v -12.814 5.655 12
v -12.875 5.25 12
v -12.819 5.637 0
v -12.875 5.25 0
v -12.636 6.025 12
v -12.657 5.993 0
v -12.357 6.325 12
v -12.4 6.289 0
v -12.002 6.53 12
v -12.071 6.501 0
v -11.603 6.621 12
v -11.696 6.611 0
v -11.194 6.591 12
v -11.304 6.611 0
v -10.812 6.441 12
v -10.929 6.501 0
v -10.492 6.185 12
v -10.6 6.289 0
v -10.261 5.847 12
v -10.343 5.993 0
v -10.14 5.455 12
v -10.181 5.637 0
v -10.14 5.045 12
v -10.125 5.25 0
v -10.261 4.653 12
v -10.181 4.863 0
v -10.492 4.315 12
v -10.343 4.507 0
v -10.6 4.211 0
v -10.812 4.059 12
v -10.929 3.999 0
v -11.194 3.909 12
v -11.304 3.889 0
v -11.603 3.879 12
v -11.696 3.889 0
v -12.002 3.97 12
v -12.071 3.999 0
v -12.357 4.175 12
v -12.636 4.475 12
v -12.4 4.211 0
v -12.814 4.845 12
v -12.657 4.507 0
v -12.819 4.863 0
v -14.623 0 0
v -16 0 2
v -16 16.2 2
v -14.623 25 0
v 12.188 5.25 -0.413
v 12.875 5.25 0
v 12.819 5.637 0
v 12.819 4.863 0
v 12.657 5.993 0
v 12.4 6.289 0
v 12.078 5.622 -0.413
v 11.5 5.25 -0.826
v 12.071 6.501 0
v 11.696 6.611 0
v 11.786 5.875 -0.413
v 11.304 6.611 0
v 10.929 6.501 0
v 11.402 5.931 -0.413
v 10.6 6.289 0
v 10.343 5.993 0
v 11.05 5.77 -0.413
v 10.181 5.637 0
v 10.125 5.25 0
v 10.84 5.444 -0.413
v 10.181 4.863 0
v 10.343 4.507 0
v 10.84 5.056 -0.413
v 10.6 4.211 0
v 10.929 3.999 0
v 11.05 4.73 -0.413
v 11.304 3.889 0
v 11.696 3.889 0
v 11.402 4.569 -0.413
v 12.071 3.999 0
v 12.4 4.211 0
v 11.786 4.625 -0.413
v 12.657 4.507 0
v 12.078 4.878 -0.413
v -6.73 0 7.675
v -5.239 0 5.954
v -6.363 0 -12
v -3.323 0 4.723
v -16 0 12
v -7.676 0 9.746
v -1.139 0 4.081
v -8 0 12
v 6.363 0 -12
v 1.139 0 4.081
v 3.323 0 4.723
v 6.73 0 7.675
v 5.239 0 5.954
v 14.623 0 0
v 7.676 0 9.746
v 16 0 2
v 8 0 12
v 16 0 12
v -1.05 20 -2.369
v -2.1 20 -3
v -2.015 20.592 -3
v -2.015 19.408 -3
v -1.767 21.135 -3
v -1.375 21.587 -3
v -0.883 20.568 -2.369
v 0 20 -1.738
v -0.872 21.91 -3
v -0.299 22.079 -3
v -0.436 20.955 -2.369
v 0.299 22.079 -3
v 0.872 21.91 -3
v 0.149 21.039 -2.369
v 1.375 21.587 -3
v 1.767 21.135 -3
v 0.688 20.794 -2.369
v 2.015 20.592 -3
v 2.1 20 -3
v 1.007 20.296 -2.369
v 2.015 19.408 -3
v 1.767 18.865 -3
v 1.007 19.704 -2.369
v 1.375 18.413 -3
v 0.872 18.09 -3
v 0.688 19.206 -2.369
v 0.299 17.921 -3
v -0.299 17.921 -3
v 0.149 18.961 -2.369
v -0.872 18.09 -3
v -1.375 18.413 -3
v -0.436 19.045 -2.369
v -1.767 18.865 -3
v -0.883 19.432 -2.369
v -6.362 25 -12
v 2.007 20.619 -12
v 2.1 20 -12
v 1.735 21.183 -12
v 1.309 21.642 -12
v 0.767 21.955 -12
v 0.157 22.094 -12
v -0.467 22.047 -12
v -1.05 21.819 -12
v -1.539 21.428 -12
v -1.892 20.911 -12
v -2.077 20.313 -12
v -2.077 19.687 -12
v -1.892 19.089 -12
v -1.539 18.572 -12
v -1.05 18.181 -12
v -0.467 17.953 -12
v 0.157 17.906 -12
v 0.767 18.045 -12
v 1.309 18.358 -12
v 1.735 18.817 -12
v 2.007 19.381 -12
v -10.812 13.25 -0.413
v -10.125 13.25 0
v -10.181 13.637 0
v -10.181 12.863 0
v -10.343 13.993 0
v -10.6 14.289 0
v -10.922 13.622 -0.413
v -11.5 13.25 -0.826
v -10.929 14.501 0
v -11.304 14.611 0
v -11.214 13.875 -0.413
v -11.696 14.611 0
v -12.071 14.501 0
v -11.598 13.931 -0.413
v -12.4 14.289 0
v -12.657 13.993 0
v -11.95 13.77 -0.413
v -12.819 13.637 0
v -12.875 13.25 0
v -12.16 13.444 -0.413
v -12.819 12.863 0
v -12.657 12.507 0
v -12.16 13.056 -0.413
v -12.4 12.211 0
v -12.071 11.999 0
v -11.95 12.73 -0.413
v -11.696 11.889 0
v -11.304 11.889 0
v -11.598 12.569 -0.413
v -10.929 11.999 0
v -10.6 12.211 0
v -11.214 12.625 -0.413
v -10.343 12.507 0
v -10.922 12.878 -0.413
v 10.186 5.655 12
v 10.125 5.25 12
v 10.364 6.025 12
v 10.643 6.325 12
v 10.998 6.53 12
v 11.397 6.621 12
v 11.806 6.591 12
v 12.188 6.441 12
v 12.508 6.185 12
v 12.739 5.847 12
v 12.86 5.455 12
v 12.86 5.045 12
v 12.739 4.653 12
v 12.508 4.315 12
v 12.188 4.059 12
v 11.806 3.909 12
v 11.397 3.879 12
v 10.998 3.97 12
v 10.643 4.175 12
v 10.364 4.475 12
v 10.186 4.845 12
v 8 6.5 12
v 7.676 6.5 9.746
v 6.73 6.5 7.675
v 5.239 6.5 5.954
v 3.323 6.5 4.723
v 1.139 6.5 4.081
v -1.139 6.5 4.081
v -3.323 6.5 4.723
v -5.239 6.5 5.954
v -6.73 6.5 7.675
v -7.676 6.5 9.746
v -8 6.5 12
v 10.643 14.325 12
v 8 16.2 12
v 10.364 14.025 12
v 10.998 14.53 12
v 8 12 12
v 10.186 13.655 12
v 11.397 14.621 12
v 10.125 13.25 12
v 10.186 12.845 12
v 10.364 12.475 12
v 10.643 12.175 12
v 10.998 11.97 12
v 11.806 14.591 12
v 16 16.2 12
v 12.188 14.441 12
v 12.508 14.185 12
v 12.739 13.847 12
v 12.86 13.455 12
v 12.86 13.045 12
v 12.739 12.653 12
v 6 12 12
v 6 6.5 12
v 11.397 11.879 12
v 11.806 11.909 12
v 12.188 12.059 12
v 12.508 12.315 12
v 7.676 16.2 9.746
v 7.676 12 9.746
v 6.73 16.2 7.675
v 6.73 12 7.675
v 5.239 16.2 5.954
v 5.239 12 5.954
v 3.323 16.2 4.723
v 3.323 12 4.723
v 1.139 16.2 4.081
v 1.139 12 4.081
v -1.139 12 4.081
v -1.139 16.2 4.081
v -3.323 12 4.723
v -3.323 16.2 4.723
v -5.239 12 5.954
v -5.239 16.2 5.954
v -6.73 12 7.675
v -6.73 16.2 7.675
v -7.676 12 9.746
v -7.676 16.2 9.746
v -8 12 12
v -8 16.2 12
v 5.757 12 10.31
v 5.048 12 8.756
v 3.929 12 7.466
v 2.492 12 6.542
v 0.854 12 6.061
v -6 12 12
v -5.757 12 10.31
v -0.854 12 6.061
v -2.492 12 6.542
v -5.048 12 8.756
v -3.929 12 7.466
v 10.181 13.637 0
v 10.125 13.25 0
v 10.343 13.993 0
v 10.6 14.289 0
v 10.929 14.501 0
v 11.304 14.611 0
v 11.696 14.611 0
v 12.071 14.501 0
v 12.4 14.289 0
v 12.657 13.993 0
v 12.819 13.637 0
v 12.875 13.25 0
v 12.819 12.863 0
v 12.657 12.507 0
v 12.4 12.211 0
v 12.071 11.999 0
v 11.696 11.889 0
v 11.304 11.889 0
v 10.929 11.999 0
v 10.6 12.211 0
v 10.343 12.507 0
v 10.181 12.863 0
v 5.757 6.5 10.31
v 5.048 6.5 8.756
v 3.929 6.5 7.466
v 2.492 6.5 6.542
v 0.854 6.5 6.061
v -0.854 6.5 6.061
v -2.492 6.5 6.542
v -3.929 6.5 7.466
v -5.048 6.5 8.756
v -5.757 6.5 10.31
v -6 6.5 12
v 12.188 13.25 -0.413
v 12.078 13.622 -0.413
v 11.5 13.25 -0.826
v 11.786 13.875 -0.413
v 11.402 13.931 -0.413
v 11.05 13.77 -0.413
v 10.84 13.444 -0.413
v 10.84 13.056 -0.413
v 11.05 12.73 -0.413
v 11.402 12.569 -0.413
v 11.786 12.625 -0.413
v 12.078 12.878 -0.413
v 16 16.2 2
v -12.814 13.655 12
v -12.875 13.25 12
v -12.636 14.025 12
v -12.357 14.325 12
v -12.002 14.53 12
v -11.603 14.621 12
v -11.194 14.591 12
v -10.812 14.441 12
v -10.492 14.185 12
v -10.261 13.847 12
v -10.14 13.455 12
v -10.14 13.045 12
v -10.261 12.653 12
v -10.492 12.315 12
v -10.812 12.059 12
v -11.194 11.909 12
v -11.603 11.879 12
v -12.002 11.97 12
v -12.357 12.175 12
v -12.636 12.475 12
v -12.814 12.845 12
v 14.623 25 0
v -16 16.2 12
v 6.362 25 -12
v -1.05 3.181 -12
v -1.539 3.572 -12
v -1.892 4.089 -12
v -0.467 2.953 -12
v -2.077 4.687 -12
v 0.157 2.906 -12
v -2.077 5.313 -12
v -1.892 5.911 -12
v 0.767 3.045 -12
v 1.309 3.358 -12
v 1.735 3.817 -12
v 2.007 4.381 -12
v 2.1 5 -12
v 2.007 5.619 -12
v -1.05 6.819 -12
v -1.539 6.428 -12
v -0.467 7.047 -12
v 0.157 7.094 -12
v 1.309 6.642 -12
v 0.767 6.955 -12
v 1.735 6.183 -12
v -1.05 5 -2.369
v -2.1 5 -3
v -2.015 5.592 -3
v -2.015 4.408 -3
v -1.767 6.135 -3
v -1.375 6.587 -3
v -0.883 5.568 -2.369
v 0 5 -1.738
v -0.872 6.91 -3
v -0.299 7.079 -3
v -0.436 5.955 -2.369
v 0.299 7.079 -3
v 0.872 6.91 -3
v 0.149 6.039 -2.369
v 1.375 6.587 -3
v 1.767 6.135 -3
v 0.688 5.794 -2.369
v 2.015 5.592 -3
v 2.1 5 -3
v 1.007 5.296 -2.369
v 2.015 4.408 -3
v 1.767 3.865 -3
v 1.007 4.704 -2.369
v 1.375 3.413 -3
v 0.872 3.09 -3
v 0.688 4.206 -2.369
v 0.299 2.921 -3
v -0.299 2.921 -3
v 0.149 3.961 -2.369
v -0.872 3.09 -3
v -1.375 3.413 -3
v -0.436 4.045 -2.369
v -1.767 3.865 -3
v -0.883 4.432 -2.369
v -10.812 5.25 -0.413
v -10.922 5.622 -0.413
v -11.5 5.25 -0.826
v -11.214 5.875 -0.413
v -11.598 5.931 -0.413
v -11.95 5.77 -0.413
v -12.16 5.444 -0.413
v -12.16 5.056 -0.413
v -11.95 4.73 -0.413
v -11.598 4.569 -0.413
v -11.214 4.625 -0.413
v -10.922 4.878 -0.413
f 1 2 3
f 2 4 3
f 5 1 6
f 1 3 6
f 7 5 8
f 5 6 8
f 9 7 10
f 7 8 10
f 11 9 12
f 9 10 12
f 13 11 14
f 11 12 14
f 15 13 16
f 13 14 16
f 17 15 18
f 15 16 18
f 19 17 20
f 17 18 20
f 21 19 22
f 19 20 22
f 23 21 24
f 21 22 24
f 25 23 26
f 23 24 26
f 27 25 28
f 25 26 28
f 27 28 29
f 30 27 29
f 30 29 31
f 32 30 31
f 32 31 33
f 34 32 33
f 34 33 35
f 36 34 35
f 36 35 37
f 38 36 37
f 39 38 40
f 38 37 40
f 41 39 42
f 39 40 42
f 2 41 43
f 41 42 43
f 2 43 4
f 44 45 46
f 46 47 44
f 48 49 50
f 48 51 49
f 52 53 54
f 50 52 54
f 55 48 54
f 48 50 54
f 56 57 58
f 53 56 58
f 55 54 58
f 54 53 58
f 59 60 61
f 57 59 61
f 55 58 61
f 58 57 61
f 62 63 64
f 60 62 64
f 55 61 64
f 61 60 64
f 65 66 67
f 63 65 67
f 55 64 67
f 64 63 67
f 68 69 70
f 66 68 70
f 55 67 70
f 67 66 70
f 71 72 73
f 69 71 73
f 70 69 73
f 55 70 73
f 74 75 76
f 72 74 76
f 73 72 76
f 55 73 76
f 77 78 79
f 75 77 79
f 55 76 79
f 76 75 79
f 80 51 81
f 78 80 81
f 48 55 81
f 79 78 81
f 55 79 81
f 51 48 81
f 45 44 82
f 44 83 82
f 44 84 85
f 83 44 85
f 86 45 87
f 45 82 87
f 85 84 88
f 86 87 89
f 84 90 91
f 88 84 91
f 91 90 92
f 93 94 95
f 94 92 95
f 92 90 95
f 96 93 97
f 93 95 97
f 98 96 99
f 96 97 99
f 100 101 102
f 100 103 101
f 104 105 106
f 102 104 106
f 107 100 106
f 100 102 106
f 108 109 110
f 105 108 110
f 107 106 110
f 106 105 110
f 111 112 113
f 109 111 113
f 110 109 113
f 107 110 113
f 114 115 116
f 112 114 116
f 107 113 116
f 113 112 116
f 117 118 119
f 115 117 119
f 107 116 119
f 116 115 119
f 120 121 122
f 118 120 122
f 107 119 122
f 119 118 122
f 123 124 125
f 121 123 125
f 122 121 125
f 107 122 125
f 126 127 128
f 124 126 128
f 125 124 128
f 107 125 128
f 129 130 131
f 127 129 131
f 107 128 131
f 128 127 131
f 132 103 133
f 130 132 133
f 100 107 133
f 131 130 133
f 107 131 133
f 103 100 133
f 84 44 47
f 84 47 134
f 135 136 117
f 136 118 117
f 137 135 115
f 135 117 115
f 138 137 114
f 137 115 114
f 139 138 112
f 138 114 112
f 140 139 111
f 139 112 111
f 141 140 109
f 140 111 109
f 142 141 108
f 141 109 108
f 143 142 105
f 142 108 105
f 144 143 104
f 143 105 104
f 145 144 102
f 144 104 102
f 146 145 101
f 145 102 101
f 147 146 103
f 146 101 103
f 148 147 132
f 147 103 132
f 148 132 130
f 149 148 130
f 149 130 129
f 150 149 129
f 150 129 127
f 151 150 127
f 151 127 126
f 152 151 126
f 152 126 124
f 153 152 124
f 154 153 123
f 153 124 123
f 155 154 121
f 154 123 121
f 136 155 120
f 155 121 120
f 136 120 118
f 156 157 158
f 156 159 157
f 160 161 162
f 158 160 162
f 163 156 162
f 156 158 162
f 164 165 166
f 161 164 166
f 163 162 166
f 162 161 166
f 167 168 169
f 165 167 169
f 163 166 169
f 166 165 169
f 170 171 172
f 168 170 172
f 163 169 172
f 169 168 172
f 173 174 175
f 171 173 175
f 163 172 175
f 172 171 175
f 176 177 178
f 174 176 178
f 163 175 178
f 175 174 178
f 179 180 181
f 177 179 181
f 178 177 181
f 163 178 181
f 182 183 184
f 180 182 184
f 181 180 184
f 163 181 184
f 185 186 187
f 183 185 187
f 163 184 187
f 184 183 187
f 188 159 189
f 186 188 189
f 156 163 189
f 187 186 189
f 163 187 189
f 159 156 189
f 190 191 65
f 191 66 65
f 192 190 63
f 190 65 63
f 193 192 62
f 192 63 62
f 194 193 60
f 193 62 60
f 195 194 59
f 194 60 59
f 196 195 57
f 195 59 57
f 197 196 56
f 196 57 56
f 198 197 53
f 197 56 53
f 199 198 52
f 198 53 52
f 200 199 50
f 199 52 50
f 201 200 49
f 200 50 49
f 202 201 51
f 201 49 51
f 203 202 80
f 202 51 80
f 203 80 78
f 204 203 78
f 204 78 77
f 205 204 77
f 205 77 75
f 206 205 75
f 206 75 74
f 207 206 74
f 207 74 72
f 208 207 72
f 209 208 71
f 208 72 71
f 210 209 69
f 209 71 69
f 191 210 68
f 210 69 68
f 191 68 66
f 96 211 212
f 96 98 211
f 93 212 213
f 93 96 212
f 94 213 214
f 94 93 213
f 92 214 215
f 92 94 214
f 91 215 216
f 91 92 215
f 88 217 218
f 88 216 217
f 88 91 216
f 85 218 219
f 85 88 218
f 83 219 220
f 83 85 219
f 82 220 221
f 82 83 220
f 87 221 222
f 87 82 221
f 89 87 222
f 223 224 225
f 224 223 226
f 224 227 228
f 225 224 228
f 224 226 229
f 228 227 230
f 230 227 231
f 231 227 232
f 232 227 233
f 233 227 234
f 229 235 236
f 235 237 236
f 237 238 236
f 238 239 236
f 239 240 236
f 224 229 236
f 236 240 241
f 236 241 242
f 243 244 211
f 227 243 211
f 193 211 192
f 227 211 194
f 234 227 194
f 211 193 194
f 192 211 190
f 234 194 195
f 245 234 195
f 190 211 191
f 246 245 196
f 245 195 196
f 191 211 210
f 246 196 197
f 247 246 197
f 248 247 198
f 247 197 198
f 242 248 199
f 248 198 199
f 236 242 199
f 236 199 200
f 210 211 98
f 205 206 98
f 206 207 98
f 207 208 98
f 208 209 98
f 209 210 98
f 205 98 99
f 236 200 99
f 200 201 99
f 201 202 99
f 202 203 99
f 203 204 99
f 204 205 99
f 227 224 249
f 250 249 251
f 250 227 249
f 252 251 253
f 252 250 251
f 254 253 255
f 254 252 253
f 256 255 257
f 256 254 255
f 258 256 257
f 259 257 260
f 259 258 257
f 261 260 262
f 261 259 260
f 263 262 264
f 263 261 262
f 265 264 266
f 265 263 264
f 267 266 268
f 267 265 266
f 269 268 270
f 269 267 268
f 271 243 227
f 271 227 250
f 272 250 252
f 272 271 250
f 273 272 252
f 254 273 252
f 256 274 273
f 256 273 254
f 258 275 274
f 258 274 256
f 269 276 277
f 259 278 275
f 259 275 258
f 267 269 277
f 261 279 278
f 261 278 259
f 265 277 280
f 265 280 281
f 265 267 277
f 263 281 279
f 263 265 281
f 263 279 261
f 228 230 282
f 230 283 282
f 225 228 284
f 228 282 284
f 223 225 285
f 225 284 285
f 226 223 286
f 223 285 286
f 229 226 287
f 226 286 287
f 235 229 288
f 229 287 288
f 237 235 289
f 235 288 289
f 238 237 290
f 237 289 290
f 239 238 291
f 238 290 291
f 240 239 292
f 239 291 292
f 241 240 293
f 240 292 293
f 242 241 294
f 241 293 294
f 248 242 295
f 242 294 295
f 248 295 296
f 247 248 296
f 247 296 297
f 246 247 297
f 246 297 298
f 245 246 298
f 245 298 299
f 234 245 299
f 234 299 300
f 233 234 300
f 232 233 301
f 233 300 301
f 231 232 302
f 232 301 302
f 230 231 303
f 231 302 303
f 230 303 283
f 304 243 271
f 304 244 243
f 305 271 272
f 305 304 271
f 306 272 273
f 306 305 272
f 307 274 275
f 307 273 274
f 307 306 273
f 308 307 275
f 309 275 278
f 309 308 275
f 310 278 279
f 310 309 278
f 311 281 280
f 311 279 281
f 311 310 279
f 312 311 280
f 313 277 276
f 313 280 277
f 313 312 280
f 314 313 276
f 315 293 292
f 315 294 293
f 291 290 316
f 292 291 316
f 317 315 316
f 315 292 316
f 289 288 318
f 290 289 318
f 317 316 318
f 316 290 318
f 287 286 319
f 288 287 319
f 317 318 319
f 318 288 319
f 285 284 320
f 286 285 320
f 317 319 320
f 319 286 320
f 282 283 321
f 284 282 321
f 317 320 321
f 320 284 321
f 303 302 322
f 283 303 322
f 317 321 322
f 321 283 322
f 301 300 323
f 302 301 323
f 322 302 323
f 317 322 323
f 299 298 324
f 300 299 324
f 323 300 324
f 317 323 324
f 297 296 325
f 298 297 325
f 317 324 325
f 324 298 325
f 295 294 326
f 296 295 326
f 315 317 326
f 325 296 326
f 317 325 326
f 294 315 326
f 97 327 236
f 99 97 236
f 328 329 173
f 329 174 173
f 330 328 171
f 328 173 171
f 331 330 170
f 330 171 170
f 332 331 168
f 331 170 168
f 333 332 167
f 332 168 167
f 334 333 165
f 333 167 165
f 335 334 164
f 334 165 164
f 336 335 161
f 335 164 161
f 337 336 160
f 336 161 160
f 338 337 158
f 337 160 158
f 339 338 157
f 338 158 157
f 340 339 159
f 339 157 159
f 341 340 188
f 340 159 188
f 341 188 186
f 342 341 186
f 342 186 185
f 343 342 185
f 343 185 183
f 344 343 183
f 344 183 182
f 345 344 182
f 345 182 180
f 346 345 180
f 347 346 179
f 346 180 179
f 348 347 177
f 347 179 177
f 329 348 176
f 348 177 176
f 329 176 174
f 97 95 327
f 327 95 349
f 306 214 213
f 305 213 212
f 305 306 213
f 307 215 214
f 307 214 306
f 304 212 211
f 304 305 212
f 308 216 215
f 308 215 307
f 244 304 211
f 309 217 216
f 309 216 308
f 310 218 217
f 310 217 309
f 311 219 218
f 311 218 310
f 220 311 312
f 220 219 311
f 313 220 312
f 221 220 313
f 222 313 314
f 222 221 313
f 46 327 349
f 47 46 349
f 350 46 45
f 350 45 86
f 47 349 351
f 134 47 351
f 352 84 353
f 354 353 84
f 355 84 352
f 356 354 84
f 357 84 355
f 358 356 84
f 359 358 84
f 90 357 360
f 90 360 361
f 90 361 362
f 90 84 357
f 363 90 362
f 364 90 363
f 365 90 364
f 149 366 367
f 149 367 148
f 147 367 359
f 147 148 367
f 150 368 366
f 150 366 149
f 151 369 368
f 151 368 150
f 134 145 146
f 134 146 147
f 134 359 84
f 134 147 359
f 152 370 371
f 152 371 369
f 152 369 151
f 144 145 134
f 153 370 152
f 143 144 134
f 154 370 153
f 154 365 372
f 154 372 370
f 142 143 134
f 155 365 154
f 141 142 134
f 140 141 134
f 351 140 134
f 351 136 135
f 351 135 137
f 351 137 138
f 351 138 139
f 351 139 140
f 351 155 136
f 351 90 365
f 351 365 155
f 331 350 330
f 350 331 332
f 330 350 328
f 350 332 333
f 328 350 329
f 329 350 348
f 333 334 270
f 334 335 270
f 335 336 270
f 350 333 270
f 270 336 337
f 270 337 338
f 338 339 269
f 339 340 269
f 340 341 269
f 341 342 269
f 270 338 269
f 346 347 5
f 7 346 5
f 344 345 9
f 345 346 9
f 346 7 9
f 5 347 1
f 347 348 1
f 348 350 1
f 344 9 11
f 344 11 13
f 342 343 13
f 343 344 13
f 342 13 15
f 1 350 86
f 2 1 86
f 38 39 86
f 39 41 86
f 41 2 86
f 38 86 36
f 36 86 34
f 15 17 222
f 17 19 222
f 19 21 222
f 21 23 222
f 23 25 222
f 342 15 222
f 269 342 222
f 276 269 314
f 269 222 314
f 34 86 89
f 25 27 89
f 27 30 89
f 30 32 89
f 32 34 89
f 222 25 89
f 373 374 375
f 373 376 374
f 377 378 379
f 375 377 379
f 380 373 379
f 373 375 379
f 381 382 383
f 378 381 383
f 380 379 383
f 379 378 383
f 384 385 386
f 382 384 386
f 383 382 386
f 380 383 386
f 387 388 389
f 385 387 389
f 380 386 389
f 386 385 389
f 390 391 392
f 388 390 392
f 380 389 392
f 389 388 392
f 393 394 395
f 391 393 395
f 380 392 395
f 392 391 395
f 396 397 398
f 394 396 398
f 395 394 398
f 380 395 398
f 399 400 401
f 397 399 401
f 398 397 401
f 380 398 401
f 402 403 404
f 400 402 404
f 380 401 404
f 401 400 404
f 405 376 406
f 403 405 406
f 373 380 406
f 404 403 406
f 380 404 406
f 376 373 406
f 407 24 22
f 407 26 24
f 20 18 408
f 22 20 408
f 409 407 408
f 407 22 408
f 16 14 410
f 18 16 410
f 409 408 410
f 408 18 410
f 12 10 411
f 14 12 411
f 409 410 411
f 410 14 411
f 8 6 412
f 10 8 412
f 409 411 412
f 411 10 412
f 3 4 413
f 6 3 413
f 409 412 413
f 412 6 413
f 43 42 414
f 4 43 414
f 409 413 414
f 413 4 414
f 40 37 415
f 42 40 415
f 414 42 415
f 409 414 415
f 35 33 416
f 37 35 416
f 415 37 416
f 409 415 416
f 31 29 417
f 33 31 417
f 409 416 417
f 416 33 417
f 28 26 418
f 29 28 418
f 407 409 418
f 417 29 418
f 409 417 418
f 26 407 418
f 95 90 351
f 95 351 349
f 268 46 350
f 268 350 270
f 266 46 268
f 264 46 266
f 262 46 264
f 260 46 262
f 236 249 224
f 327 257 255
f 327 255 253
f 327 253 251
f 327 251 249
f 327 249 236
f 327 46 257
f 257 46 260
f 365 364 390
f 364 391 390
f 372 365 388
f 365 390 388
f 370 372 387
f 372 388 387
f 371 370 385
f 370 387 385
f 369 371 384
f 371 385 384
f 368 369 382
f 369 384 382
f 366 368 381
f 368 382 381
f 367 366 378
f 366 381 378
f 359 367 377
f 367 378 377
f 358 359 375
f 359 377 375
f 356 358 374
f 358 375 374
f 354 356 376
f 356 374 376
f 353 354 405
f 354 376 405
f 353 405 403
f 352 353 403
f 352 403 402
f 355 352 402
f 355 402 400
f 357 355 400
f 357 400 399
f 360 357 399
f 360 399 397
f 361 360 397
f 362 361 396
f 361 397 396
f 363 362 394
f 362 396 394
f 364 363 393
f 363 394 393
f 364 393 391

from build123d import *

# Parameters (mm, degrees)
SKETCH1_W                 = 12
SKETCH1_H                 = 25
BOSS_EXTRUDE1_DEPTH       = 16
SKETCH2_W                 = 32
SKETCH2_H                 = 10
BOSS_EXTRUDE2_DEPTH       = 16.2
BOSS_EXTRUDE3_DEPTH       = 32
M5X0_8_TAPPED_HOLE1_D     = 4.2
M5X0_8_TAPPED_HOLE1_DEPTH = 9
M5X0_8_TAPPED_HOLE1_TIP   = 1.2618073
CUT_EXTRUDE2_REACH        = 27
M3X0_5_TAPPED_HOLE1_D     = 2.75
M3X0_5_TAPPED_HOLE1_DEPTH = 12
M3X0_5_TAPPED_HOLE1_TIP   = 0.826183351


with BuildPart() as part:
    # Sketch1 → Boss-Extrude1 (new body, symmetric)
    with BuildSketch(Plane(origin=(0, 0, 0), x_dir=(0, 0, -1), z_dir=(1, 0, 0))):
        with Locations((6, 12.5)):
            Rectangle(SKETCH1_W, SKETCH1_H)
    extrude(amount=BOSS_EXTRUDE1_DEPTH, both=True)



with BuildPart() as body_2:
    # Sketch2 → Boss-Extrude2 (new body)
    with BuildSketch(Plane(origin=(0, 0, 0), x_dir=(1, 0, 0), z_dir=(0, 1, 0))):
        with Locations((0, -7)):
            Rectangle(SKETCH2_W, SKETCH2_H)
    extrude(amount=BOSS_EXTRUDE2_DEPTH)


with BuildPart() as part_1:
    add(part.part)

    add(body_2.part)  # Boss-Extrude3 merges body 2
    # Sketch3 → Boss-Extrude3 (add)
    with BuildSketch(Plane(origin=(16, 0, 0), x_dir=(0, 0, -1), z_dir=(1, 0, 0))):
        Polygon((-2, 0), (-2, 16.2), (0, 25), (0, 0), align=None)
    extrude(amount=-BOSS_EXTRUDE3_DEPTH)

    # M5x0.8 Tapped Hole1
    with Locations(Plane(origin=(0, 0, -12), x_dir=(-1, 0, 0), z_dir=(0, 0, -1))):
        with Locations((0, 20), (0, 5)):
            Hole(M5X0_8_TAPPED_HOLE1_D / 2, depth=M5X0_8_TAPPED_HOLE1_DEPTH)
            with Locations((0, 0, -(M5X0_8_TAPPED_HOLE1_DEPTH + M5X0_8_TAPPED_HOLE1_TIP / 2))):  # 118° drill point
                Cone(0, M5X0_8_TAPPED_HOLE1_D / 2, M5X0_8_TAPPED_HOLE1_TIP, mode=Mode.SUBTRACT)

    # Sketch9 → Cut-Revolve1 (revolve, cut)
    with BuildSketch(Plane(origin=(0, 0, 0), x_dir=(0, 0, -1), z_dir=(1, 0, 0))):
        Polygon((-12, 16.2), (-4, 16.2), (-4, 12), (-6, 12), (-6, 6.5), (-4, 6.5), (-4, 0), (-12, 0), align=None)
    revolve(axis=Axis((0, 0, 12), (0, 1, 0)), mode=Mode.SUBTRACT)

    # Sketch10 → Cut-Extrude2 (cut, up to next)
    with BuildSketch(Plane(origin=(0, 25, 0), x_dir=(1, 0, 0), z_dir=(0, 1, 0)), mode=Mode.PRIVATE) as cut_extrude2_sk1:
        Polygon((6.3625, 12), (14.623214286, 0), (16, 0), (16, 12), align=None)
    cut_extrude2_tool1 = extrude(cut_extrude2_sk1.sketch, amount=-CUT_EXTRUDE2_REACH, mode=Mode.PRIVATE) & part_1.part
    add(cut_extrude2_tool1.solids().sort_by_distance((12.730134, 25, -7.5))[0], mode=Mode.SUBTRACT)
    # Sketch10 → Cut-Extrude2 (cut, up to next)
    with BuildSketch(Plane(origin=(0, 25, 0), x_dir=(1, 0, 0), z_dir=(0, 1, 0)), mode=Mode.PRIVATE) as cut_extrude2_sk2:
        Polygon((16, 0), (14.623214286, 0), (16, -2), align=None)
    cut_extrude2_tool2 = extrude(cut_extrude2_sk2.sketch, amount=-CUT_EXTRUDE2_REACH, mode=Mode.PRIVATE) & part_1.part
    add(cut_extrude2_tool2.solids().sort_by_distance((15.541071, 25, 0.666667))[0], mode=Mode.SUBTRACT)
    # Sketch10 → Cut-Extrude2 (cut, up to next)
    with BuildSketch(Plane(origin=(0, 25, 0), x_dir=(1, 0, 0), z_dir=(0, 1, 0)), mode=Mode.PRIVATE) as cut_extrude2_sk3:
        Polygon((-16, 0), (-14.623214286, 0), (-6.3625, 12), (-16, 12), align=None)
    cut_extrude2_tool3 = extrude(cut_extrude2_sk3.sketch, amount=-CUT_EXTRUDE2_REACH, mode=Mode.PRIVATE) & part_1.part
    add(cut_extrude2_tool3.solids().sort_by_distance((-12.730134, 25, -7.5))[0], mode=Mode.SUBTRACT)
    # Sketch10 → Cut-Extrude2 (cut, up to next)
    with BuildSketch(Plane(origin=(0, 25, 0), x_dir=(1, 0, 0), z_dir=(0, 1, 0)), mode=Mode.PRIVATE) as cut_extrude2_sk4:
        Polygon((-16, 0), (-16, -2), (-14.623214286, 0), align=None)
    cut_extrude2_tool4 = extrude(cut_extrude2_sk4.sketch, amount=-CUT_EXTRUDE2_REACH, mode=Mode.PRIVATE) & part_1.part
    add(cut_extrude2_tool4.solids().sort_by_distance((-15.541071, 25, 0.666667))[0], mode=Mode.SUBTRACT)

    # M3x0.5 Tapped Hole1
    with Locations(Plane.XY.offset(12)):
        with Locations((-11.5, 13.25), (11.5, 13.25), (-11.5, 5.25), (11.5, 5.25)):
            Hole(M3X0_5_TAPPED_HOLE1_D / 2, depth=M3X0_5_TAPPED_HOLE1_DEPTH)
            with Locations((0, 0, -(M3X0_5_TAPPED_HOLE1_DEPTH + M3X0_5_TAPPED_HOLE1_TIP / 2))):  # 118° drill point
                Cone(0, M3X0_5_TAPPED_HOLE1_D / 2, M3X0_5_TAPPED_HOLE1_TIP, mode=Mode.SUBTRACT)


solid = part_1.part
